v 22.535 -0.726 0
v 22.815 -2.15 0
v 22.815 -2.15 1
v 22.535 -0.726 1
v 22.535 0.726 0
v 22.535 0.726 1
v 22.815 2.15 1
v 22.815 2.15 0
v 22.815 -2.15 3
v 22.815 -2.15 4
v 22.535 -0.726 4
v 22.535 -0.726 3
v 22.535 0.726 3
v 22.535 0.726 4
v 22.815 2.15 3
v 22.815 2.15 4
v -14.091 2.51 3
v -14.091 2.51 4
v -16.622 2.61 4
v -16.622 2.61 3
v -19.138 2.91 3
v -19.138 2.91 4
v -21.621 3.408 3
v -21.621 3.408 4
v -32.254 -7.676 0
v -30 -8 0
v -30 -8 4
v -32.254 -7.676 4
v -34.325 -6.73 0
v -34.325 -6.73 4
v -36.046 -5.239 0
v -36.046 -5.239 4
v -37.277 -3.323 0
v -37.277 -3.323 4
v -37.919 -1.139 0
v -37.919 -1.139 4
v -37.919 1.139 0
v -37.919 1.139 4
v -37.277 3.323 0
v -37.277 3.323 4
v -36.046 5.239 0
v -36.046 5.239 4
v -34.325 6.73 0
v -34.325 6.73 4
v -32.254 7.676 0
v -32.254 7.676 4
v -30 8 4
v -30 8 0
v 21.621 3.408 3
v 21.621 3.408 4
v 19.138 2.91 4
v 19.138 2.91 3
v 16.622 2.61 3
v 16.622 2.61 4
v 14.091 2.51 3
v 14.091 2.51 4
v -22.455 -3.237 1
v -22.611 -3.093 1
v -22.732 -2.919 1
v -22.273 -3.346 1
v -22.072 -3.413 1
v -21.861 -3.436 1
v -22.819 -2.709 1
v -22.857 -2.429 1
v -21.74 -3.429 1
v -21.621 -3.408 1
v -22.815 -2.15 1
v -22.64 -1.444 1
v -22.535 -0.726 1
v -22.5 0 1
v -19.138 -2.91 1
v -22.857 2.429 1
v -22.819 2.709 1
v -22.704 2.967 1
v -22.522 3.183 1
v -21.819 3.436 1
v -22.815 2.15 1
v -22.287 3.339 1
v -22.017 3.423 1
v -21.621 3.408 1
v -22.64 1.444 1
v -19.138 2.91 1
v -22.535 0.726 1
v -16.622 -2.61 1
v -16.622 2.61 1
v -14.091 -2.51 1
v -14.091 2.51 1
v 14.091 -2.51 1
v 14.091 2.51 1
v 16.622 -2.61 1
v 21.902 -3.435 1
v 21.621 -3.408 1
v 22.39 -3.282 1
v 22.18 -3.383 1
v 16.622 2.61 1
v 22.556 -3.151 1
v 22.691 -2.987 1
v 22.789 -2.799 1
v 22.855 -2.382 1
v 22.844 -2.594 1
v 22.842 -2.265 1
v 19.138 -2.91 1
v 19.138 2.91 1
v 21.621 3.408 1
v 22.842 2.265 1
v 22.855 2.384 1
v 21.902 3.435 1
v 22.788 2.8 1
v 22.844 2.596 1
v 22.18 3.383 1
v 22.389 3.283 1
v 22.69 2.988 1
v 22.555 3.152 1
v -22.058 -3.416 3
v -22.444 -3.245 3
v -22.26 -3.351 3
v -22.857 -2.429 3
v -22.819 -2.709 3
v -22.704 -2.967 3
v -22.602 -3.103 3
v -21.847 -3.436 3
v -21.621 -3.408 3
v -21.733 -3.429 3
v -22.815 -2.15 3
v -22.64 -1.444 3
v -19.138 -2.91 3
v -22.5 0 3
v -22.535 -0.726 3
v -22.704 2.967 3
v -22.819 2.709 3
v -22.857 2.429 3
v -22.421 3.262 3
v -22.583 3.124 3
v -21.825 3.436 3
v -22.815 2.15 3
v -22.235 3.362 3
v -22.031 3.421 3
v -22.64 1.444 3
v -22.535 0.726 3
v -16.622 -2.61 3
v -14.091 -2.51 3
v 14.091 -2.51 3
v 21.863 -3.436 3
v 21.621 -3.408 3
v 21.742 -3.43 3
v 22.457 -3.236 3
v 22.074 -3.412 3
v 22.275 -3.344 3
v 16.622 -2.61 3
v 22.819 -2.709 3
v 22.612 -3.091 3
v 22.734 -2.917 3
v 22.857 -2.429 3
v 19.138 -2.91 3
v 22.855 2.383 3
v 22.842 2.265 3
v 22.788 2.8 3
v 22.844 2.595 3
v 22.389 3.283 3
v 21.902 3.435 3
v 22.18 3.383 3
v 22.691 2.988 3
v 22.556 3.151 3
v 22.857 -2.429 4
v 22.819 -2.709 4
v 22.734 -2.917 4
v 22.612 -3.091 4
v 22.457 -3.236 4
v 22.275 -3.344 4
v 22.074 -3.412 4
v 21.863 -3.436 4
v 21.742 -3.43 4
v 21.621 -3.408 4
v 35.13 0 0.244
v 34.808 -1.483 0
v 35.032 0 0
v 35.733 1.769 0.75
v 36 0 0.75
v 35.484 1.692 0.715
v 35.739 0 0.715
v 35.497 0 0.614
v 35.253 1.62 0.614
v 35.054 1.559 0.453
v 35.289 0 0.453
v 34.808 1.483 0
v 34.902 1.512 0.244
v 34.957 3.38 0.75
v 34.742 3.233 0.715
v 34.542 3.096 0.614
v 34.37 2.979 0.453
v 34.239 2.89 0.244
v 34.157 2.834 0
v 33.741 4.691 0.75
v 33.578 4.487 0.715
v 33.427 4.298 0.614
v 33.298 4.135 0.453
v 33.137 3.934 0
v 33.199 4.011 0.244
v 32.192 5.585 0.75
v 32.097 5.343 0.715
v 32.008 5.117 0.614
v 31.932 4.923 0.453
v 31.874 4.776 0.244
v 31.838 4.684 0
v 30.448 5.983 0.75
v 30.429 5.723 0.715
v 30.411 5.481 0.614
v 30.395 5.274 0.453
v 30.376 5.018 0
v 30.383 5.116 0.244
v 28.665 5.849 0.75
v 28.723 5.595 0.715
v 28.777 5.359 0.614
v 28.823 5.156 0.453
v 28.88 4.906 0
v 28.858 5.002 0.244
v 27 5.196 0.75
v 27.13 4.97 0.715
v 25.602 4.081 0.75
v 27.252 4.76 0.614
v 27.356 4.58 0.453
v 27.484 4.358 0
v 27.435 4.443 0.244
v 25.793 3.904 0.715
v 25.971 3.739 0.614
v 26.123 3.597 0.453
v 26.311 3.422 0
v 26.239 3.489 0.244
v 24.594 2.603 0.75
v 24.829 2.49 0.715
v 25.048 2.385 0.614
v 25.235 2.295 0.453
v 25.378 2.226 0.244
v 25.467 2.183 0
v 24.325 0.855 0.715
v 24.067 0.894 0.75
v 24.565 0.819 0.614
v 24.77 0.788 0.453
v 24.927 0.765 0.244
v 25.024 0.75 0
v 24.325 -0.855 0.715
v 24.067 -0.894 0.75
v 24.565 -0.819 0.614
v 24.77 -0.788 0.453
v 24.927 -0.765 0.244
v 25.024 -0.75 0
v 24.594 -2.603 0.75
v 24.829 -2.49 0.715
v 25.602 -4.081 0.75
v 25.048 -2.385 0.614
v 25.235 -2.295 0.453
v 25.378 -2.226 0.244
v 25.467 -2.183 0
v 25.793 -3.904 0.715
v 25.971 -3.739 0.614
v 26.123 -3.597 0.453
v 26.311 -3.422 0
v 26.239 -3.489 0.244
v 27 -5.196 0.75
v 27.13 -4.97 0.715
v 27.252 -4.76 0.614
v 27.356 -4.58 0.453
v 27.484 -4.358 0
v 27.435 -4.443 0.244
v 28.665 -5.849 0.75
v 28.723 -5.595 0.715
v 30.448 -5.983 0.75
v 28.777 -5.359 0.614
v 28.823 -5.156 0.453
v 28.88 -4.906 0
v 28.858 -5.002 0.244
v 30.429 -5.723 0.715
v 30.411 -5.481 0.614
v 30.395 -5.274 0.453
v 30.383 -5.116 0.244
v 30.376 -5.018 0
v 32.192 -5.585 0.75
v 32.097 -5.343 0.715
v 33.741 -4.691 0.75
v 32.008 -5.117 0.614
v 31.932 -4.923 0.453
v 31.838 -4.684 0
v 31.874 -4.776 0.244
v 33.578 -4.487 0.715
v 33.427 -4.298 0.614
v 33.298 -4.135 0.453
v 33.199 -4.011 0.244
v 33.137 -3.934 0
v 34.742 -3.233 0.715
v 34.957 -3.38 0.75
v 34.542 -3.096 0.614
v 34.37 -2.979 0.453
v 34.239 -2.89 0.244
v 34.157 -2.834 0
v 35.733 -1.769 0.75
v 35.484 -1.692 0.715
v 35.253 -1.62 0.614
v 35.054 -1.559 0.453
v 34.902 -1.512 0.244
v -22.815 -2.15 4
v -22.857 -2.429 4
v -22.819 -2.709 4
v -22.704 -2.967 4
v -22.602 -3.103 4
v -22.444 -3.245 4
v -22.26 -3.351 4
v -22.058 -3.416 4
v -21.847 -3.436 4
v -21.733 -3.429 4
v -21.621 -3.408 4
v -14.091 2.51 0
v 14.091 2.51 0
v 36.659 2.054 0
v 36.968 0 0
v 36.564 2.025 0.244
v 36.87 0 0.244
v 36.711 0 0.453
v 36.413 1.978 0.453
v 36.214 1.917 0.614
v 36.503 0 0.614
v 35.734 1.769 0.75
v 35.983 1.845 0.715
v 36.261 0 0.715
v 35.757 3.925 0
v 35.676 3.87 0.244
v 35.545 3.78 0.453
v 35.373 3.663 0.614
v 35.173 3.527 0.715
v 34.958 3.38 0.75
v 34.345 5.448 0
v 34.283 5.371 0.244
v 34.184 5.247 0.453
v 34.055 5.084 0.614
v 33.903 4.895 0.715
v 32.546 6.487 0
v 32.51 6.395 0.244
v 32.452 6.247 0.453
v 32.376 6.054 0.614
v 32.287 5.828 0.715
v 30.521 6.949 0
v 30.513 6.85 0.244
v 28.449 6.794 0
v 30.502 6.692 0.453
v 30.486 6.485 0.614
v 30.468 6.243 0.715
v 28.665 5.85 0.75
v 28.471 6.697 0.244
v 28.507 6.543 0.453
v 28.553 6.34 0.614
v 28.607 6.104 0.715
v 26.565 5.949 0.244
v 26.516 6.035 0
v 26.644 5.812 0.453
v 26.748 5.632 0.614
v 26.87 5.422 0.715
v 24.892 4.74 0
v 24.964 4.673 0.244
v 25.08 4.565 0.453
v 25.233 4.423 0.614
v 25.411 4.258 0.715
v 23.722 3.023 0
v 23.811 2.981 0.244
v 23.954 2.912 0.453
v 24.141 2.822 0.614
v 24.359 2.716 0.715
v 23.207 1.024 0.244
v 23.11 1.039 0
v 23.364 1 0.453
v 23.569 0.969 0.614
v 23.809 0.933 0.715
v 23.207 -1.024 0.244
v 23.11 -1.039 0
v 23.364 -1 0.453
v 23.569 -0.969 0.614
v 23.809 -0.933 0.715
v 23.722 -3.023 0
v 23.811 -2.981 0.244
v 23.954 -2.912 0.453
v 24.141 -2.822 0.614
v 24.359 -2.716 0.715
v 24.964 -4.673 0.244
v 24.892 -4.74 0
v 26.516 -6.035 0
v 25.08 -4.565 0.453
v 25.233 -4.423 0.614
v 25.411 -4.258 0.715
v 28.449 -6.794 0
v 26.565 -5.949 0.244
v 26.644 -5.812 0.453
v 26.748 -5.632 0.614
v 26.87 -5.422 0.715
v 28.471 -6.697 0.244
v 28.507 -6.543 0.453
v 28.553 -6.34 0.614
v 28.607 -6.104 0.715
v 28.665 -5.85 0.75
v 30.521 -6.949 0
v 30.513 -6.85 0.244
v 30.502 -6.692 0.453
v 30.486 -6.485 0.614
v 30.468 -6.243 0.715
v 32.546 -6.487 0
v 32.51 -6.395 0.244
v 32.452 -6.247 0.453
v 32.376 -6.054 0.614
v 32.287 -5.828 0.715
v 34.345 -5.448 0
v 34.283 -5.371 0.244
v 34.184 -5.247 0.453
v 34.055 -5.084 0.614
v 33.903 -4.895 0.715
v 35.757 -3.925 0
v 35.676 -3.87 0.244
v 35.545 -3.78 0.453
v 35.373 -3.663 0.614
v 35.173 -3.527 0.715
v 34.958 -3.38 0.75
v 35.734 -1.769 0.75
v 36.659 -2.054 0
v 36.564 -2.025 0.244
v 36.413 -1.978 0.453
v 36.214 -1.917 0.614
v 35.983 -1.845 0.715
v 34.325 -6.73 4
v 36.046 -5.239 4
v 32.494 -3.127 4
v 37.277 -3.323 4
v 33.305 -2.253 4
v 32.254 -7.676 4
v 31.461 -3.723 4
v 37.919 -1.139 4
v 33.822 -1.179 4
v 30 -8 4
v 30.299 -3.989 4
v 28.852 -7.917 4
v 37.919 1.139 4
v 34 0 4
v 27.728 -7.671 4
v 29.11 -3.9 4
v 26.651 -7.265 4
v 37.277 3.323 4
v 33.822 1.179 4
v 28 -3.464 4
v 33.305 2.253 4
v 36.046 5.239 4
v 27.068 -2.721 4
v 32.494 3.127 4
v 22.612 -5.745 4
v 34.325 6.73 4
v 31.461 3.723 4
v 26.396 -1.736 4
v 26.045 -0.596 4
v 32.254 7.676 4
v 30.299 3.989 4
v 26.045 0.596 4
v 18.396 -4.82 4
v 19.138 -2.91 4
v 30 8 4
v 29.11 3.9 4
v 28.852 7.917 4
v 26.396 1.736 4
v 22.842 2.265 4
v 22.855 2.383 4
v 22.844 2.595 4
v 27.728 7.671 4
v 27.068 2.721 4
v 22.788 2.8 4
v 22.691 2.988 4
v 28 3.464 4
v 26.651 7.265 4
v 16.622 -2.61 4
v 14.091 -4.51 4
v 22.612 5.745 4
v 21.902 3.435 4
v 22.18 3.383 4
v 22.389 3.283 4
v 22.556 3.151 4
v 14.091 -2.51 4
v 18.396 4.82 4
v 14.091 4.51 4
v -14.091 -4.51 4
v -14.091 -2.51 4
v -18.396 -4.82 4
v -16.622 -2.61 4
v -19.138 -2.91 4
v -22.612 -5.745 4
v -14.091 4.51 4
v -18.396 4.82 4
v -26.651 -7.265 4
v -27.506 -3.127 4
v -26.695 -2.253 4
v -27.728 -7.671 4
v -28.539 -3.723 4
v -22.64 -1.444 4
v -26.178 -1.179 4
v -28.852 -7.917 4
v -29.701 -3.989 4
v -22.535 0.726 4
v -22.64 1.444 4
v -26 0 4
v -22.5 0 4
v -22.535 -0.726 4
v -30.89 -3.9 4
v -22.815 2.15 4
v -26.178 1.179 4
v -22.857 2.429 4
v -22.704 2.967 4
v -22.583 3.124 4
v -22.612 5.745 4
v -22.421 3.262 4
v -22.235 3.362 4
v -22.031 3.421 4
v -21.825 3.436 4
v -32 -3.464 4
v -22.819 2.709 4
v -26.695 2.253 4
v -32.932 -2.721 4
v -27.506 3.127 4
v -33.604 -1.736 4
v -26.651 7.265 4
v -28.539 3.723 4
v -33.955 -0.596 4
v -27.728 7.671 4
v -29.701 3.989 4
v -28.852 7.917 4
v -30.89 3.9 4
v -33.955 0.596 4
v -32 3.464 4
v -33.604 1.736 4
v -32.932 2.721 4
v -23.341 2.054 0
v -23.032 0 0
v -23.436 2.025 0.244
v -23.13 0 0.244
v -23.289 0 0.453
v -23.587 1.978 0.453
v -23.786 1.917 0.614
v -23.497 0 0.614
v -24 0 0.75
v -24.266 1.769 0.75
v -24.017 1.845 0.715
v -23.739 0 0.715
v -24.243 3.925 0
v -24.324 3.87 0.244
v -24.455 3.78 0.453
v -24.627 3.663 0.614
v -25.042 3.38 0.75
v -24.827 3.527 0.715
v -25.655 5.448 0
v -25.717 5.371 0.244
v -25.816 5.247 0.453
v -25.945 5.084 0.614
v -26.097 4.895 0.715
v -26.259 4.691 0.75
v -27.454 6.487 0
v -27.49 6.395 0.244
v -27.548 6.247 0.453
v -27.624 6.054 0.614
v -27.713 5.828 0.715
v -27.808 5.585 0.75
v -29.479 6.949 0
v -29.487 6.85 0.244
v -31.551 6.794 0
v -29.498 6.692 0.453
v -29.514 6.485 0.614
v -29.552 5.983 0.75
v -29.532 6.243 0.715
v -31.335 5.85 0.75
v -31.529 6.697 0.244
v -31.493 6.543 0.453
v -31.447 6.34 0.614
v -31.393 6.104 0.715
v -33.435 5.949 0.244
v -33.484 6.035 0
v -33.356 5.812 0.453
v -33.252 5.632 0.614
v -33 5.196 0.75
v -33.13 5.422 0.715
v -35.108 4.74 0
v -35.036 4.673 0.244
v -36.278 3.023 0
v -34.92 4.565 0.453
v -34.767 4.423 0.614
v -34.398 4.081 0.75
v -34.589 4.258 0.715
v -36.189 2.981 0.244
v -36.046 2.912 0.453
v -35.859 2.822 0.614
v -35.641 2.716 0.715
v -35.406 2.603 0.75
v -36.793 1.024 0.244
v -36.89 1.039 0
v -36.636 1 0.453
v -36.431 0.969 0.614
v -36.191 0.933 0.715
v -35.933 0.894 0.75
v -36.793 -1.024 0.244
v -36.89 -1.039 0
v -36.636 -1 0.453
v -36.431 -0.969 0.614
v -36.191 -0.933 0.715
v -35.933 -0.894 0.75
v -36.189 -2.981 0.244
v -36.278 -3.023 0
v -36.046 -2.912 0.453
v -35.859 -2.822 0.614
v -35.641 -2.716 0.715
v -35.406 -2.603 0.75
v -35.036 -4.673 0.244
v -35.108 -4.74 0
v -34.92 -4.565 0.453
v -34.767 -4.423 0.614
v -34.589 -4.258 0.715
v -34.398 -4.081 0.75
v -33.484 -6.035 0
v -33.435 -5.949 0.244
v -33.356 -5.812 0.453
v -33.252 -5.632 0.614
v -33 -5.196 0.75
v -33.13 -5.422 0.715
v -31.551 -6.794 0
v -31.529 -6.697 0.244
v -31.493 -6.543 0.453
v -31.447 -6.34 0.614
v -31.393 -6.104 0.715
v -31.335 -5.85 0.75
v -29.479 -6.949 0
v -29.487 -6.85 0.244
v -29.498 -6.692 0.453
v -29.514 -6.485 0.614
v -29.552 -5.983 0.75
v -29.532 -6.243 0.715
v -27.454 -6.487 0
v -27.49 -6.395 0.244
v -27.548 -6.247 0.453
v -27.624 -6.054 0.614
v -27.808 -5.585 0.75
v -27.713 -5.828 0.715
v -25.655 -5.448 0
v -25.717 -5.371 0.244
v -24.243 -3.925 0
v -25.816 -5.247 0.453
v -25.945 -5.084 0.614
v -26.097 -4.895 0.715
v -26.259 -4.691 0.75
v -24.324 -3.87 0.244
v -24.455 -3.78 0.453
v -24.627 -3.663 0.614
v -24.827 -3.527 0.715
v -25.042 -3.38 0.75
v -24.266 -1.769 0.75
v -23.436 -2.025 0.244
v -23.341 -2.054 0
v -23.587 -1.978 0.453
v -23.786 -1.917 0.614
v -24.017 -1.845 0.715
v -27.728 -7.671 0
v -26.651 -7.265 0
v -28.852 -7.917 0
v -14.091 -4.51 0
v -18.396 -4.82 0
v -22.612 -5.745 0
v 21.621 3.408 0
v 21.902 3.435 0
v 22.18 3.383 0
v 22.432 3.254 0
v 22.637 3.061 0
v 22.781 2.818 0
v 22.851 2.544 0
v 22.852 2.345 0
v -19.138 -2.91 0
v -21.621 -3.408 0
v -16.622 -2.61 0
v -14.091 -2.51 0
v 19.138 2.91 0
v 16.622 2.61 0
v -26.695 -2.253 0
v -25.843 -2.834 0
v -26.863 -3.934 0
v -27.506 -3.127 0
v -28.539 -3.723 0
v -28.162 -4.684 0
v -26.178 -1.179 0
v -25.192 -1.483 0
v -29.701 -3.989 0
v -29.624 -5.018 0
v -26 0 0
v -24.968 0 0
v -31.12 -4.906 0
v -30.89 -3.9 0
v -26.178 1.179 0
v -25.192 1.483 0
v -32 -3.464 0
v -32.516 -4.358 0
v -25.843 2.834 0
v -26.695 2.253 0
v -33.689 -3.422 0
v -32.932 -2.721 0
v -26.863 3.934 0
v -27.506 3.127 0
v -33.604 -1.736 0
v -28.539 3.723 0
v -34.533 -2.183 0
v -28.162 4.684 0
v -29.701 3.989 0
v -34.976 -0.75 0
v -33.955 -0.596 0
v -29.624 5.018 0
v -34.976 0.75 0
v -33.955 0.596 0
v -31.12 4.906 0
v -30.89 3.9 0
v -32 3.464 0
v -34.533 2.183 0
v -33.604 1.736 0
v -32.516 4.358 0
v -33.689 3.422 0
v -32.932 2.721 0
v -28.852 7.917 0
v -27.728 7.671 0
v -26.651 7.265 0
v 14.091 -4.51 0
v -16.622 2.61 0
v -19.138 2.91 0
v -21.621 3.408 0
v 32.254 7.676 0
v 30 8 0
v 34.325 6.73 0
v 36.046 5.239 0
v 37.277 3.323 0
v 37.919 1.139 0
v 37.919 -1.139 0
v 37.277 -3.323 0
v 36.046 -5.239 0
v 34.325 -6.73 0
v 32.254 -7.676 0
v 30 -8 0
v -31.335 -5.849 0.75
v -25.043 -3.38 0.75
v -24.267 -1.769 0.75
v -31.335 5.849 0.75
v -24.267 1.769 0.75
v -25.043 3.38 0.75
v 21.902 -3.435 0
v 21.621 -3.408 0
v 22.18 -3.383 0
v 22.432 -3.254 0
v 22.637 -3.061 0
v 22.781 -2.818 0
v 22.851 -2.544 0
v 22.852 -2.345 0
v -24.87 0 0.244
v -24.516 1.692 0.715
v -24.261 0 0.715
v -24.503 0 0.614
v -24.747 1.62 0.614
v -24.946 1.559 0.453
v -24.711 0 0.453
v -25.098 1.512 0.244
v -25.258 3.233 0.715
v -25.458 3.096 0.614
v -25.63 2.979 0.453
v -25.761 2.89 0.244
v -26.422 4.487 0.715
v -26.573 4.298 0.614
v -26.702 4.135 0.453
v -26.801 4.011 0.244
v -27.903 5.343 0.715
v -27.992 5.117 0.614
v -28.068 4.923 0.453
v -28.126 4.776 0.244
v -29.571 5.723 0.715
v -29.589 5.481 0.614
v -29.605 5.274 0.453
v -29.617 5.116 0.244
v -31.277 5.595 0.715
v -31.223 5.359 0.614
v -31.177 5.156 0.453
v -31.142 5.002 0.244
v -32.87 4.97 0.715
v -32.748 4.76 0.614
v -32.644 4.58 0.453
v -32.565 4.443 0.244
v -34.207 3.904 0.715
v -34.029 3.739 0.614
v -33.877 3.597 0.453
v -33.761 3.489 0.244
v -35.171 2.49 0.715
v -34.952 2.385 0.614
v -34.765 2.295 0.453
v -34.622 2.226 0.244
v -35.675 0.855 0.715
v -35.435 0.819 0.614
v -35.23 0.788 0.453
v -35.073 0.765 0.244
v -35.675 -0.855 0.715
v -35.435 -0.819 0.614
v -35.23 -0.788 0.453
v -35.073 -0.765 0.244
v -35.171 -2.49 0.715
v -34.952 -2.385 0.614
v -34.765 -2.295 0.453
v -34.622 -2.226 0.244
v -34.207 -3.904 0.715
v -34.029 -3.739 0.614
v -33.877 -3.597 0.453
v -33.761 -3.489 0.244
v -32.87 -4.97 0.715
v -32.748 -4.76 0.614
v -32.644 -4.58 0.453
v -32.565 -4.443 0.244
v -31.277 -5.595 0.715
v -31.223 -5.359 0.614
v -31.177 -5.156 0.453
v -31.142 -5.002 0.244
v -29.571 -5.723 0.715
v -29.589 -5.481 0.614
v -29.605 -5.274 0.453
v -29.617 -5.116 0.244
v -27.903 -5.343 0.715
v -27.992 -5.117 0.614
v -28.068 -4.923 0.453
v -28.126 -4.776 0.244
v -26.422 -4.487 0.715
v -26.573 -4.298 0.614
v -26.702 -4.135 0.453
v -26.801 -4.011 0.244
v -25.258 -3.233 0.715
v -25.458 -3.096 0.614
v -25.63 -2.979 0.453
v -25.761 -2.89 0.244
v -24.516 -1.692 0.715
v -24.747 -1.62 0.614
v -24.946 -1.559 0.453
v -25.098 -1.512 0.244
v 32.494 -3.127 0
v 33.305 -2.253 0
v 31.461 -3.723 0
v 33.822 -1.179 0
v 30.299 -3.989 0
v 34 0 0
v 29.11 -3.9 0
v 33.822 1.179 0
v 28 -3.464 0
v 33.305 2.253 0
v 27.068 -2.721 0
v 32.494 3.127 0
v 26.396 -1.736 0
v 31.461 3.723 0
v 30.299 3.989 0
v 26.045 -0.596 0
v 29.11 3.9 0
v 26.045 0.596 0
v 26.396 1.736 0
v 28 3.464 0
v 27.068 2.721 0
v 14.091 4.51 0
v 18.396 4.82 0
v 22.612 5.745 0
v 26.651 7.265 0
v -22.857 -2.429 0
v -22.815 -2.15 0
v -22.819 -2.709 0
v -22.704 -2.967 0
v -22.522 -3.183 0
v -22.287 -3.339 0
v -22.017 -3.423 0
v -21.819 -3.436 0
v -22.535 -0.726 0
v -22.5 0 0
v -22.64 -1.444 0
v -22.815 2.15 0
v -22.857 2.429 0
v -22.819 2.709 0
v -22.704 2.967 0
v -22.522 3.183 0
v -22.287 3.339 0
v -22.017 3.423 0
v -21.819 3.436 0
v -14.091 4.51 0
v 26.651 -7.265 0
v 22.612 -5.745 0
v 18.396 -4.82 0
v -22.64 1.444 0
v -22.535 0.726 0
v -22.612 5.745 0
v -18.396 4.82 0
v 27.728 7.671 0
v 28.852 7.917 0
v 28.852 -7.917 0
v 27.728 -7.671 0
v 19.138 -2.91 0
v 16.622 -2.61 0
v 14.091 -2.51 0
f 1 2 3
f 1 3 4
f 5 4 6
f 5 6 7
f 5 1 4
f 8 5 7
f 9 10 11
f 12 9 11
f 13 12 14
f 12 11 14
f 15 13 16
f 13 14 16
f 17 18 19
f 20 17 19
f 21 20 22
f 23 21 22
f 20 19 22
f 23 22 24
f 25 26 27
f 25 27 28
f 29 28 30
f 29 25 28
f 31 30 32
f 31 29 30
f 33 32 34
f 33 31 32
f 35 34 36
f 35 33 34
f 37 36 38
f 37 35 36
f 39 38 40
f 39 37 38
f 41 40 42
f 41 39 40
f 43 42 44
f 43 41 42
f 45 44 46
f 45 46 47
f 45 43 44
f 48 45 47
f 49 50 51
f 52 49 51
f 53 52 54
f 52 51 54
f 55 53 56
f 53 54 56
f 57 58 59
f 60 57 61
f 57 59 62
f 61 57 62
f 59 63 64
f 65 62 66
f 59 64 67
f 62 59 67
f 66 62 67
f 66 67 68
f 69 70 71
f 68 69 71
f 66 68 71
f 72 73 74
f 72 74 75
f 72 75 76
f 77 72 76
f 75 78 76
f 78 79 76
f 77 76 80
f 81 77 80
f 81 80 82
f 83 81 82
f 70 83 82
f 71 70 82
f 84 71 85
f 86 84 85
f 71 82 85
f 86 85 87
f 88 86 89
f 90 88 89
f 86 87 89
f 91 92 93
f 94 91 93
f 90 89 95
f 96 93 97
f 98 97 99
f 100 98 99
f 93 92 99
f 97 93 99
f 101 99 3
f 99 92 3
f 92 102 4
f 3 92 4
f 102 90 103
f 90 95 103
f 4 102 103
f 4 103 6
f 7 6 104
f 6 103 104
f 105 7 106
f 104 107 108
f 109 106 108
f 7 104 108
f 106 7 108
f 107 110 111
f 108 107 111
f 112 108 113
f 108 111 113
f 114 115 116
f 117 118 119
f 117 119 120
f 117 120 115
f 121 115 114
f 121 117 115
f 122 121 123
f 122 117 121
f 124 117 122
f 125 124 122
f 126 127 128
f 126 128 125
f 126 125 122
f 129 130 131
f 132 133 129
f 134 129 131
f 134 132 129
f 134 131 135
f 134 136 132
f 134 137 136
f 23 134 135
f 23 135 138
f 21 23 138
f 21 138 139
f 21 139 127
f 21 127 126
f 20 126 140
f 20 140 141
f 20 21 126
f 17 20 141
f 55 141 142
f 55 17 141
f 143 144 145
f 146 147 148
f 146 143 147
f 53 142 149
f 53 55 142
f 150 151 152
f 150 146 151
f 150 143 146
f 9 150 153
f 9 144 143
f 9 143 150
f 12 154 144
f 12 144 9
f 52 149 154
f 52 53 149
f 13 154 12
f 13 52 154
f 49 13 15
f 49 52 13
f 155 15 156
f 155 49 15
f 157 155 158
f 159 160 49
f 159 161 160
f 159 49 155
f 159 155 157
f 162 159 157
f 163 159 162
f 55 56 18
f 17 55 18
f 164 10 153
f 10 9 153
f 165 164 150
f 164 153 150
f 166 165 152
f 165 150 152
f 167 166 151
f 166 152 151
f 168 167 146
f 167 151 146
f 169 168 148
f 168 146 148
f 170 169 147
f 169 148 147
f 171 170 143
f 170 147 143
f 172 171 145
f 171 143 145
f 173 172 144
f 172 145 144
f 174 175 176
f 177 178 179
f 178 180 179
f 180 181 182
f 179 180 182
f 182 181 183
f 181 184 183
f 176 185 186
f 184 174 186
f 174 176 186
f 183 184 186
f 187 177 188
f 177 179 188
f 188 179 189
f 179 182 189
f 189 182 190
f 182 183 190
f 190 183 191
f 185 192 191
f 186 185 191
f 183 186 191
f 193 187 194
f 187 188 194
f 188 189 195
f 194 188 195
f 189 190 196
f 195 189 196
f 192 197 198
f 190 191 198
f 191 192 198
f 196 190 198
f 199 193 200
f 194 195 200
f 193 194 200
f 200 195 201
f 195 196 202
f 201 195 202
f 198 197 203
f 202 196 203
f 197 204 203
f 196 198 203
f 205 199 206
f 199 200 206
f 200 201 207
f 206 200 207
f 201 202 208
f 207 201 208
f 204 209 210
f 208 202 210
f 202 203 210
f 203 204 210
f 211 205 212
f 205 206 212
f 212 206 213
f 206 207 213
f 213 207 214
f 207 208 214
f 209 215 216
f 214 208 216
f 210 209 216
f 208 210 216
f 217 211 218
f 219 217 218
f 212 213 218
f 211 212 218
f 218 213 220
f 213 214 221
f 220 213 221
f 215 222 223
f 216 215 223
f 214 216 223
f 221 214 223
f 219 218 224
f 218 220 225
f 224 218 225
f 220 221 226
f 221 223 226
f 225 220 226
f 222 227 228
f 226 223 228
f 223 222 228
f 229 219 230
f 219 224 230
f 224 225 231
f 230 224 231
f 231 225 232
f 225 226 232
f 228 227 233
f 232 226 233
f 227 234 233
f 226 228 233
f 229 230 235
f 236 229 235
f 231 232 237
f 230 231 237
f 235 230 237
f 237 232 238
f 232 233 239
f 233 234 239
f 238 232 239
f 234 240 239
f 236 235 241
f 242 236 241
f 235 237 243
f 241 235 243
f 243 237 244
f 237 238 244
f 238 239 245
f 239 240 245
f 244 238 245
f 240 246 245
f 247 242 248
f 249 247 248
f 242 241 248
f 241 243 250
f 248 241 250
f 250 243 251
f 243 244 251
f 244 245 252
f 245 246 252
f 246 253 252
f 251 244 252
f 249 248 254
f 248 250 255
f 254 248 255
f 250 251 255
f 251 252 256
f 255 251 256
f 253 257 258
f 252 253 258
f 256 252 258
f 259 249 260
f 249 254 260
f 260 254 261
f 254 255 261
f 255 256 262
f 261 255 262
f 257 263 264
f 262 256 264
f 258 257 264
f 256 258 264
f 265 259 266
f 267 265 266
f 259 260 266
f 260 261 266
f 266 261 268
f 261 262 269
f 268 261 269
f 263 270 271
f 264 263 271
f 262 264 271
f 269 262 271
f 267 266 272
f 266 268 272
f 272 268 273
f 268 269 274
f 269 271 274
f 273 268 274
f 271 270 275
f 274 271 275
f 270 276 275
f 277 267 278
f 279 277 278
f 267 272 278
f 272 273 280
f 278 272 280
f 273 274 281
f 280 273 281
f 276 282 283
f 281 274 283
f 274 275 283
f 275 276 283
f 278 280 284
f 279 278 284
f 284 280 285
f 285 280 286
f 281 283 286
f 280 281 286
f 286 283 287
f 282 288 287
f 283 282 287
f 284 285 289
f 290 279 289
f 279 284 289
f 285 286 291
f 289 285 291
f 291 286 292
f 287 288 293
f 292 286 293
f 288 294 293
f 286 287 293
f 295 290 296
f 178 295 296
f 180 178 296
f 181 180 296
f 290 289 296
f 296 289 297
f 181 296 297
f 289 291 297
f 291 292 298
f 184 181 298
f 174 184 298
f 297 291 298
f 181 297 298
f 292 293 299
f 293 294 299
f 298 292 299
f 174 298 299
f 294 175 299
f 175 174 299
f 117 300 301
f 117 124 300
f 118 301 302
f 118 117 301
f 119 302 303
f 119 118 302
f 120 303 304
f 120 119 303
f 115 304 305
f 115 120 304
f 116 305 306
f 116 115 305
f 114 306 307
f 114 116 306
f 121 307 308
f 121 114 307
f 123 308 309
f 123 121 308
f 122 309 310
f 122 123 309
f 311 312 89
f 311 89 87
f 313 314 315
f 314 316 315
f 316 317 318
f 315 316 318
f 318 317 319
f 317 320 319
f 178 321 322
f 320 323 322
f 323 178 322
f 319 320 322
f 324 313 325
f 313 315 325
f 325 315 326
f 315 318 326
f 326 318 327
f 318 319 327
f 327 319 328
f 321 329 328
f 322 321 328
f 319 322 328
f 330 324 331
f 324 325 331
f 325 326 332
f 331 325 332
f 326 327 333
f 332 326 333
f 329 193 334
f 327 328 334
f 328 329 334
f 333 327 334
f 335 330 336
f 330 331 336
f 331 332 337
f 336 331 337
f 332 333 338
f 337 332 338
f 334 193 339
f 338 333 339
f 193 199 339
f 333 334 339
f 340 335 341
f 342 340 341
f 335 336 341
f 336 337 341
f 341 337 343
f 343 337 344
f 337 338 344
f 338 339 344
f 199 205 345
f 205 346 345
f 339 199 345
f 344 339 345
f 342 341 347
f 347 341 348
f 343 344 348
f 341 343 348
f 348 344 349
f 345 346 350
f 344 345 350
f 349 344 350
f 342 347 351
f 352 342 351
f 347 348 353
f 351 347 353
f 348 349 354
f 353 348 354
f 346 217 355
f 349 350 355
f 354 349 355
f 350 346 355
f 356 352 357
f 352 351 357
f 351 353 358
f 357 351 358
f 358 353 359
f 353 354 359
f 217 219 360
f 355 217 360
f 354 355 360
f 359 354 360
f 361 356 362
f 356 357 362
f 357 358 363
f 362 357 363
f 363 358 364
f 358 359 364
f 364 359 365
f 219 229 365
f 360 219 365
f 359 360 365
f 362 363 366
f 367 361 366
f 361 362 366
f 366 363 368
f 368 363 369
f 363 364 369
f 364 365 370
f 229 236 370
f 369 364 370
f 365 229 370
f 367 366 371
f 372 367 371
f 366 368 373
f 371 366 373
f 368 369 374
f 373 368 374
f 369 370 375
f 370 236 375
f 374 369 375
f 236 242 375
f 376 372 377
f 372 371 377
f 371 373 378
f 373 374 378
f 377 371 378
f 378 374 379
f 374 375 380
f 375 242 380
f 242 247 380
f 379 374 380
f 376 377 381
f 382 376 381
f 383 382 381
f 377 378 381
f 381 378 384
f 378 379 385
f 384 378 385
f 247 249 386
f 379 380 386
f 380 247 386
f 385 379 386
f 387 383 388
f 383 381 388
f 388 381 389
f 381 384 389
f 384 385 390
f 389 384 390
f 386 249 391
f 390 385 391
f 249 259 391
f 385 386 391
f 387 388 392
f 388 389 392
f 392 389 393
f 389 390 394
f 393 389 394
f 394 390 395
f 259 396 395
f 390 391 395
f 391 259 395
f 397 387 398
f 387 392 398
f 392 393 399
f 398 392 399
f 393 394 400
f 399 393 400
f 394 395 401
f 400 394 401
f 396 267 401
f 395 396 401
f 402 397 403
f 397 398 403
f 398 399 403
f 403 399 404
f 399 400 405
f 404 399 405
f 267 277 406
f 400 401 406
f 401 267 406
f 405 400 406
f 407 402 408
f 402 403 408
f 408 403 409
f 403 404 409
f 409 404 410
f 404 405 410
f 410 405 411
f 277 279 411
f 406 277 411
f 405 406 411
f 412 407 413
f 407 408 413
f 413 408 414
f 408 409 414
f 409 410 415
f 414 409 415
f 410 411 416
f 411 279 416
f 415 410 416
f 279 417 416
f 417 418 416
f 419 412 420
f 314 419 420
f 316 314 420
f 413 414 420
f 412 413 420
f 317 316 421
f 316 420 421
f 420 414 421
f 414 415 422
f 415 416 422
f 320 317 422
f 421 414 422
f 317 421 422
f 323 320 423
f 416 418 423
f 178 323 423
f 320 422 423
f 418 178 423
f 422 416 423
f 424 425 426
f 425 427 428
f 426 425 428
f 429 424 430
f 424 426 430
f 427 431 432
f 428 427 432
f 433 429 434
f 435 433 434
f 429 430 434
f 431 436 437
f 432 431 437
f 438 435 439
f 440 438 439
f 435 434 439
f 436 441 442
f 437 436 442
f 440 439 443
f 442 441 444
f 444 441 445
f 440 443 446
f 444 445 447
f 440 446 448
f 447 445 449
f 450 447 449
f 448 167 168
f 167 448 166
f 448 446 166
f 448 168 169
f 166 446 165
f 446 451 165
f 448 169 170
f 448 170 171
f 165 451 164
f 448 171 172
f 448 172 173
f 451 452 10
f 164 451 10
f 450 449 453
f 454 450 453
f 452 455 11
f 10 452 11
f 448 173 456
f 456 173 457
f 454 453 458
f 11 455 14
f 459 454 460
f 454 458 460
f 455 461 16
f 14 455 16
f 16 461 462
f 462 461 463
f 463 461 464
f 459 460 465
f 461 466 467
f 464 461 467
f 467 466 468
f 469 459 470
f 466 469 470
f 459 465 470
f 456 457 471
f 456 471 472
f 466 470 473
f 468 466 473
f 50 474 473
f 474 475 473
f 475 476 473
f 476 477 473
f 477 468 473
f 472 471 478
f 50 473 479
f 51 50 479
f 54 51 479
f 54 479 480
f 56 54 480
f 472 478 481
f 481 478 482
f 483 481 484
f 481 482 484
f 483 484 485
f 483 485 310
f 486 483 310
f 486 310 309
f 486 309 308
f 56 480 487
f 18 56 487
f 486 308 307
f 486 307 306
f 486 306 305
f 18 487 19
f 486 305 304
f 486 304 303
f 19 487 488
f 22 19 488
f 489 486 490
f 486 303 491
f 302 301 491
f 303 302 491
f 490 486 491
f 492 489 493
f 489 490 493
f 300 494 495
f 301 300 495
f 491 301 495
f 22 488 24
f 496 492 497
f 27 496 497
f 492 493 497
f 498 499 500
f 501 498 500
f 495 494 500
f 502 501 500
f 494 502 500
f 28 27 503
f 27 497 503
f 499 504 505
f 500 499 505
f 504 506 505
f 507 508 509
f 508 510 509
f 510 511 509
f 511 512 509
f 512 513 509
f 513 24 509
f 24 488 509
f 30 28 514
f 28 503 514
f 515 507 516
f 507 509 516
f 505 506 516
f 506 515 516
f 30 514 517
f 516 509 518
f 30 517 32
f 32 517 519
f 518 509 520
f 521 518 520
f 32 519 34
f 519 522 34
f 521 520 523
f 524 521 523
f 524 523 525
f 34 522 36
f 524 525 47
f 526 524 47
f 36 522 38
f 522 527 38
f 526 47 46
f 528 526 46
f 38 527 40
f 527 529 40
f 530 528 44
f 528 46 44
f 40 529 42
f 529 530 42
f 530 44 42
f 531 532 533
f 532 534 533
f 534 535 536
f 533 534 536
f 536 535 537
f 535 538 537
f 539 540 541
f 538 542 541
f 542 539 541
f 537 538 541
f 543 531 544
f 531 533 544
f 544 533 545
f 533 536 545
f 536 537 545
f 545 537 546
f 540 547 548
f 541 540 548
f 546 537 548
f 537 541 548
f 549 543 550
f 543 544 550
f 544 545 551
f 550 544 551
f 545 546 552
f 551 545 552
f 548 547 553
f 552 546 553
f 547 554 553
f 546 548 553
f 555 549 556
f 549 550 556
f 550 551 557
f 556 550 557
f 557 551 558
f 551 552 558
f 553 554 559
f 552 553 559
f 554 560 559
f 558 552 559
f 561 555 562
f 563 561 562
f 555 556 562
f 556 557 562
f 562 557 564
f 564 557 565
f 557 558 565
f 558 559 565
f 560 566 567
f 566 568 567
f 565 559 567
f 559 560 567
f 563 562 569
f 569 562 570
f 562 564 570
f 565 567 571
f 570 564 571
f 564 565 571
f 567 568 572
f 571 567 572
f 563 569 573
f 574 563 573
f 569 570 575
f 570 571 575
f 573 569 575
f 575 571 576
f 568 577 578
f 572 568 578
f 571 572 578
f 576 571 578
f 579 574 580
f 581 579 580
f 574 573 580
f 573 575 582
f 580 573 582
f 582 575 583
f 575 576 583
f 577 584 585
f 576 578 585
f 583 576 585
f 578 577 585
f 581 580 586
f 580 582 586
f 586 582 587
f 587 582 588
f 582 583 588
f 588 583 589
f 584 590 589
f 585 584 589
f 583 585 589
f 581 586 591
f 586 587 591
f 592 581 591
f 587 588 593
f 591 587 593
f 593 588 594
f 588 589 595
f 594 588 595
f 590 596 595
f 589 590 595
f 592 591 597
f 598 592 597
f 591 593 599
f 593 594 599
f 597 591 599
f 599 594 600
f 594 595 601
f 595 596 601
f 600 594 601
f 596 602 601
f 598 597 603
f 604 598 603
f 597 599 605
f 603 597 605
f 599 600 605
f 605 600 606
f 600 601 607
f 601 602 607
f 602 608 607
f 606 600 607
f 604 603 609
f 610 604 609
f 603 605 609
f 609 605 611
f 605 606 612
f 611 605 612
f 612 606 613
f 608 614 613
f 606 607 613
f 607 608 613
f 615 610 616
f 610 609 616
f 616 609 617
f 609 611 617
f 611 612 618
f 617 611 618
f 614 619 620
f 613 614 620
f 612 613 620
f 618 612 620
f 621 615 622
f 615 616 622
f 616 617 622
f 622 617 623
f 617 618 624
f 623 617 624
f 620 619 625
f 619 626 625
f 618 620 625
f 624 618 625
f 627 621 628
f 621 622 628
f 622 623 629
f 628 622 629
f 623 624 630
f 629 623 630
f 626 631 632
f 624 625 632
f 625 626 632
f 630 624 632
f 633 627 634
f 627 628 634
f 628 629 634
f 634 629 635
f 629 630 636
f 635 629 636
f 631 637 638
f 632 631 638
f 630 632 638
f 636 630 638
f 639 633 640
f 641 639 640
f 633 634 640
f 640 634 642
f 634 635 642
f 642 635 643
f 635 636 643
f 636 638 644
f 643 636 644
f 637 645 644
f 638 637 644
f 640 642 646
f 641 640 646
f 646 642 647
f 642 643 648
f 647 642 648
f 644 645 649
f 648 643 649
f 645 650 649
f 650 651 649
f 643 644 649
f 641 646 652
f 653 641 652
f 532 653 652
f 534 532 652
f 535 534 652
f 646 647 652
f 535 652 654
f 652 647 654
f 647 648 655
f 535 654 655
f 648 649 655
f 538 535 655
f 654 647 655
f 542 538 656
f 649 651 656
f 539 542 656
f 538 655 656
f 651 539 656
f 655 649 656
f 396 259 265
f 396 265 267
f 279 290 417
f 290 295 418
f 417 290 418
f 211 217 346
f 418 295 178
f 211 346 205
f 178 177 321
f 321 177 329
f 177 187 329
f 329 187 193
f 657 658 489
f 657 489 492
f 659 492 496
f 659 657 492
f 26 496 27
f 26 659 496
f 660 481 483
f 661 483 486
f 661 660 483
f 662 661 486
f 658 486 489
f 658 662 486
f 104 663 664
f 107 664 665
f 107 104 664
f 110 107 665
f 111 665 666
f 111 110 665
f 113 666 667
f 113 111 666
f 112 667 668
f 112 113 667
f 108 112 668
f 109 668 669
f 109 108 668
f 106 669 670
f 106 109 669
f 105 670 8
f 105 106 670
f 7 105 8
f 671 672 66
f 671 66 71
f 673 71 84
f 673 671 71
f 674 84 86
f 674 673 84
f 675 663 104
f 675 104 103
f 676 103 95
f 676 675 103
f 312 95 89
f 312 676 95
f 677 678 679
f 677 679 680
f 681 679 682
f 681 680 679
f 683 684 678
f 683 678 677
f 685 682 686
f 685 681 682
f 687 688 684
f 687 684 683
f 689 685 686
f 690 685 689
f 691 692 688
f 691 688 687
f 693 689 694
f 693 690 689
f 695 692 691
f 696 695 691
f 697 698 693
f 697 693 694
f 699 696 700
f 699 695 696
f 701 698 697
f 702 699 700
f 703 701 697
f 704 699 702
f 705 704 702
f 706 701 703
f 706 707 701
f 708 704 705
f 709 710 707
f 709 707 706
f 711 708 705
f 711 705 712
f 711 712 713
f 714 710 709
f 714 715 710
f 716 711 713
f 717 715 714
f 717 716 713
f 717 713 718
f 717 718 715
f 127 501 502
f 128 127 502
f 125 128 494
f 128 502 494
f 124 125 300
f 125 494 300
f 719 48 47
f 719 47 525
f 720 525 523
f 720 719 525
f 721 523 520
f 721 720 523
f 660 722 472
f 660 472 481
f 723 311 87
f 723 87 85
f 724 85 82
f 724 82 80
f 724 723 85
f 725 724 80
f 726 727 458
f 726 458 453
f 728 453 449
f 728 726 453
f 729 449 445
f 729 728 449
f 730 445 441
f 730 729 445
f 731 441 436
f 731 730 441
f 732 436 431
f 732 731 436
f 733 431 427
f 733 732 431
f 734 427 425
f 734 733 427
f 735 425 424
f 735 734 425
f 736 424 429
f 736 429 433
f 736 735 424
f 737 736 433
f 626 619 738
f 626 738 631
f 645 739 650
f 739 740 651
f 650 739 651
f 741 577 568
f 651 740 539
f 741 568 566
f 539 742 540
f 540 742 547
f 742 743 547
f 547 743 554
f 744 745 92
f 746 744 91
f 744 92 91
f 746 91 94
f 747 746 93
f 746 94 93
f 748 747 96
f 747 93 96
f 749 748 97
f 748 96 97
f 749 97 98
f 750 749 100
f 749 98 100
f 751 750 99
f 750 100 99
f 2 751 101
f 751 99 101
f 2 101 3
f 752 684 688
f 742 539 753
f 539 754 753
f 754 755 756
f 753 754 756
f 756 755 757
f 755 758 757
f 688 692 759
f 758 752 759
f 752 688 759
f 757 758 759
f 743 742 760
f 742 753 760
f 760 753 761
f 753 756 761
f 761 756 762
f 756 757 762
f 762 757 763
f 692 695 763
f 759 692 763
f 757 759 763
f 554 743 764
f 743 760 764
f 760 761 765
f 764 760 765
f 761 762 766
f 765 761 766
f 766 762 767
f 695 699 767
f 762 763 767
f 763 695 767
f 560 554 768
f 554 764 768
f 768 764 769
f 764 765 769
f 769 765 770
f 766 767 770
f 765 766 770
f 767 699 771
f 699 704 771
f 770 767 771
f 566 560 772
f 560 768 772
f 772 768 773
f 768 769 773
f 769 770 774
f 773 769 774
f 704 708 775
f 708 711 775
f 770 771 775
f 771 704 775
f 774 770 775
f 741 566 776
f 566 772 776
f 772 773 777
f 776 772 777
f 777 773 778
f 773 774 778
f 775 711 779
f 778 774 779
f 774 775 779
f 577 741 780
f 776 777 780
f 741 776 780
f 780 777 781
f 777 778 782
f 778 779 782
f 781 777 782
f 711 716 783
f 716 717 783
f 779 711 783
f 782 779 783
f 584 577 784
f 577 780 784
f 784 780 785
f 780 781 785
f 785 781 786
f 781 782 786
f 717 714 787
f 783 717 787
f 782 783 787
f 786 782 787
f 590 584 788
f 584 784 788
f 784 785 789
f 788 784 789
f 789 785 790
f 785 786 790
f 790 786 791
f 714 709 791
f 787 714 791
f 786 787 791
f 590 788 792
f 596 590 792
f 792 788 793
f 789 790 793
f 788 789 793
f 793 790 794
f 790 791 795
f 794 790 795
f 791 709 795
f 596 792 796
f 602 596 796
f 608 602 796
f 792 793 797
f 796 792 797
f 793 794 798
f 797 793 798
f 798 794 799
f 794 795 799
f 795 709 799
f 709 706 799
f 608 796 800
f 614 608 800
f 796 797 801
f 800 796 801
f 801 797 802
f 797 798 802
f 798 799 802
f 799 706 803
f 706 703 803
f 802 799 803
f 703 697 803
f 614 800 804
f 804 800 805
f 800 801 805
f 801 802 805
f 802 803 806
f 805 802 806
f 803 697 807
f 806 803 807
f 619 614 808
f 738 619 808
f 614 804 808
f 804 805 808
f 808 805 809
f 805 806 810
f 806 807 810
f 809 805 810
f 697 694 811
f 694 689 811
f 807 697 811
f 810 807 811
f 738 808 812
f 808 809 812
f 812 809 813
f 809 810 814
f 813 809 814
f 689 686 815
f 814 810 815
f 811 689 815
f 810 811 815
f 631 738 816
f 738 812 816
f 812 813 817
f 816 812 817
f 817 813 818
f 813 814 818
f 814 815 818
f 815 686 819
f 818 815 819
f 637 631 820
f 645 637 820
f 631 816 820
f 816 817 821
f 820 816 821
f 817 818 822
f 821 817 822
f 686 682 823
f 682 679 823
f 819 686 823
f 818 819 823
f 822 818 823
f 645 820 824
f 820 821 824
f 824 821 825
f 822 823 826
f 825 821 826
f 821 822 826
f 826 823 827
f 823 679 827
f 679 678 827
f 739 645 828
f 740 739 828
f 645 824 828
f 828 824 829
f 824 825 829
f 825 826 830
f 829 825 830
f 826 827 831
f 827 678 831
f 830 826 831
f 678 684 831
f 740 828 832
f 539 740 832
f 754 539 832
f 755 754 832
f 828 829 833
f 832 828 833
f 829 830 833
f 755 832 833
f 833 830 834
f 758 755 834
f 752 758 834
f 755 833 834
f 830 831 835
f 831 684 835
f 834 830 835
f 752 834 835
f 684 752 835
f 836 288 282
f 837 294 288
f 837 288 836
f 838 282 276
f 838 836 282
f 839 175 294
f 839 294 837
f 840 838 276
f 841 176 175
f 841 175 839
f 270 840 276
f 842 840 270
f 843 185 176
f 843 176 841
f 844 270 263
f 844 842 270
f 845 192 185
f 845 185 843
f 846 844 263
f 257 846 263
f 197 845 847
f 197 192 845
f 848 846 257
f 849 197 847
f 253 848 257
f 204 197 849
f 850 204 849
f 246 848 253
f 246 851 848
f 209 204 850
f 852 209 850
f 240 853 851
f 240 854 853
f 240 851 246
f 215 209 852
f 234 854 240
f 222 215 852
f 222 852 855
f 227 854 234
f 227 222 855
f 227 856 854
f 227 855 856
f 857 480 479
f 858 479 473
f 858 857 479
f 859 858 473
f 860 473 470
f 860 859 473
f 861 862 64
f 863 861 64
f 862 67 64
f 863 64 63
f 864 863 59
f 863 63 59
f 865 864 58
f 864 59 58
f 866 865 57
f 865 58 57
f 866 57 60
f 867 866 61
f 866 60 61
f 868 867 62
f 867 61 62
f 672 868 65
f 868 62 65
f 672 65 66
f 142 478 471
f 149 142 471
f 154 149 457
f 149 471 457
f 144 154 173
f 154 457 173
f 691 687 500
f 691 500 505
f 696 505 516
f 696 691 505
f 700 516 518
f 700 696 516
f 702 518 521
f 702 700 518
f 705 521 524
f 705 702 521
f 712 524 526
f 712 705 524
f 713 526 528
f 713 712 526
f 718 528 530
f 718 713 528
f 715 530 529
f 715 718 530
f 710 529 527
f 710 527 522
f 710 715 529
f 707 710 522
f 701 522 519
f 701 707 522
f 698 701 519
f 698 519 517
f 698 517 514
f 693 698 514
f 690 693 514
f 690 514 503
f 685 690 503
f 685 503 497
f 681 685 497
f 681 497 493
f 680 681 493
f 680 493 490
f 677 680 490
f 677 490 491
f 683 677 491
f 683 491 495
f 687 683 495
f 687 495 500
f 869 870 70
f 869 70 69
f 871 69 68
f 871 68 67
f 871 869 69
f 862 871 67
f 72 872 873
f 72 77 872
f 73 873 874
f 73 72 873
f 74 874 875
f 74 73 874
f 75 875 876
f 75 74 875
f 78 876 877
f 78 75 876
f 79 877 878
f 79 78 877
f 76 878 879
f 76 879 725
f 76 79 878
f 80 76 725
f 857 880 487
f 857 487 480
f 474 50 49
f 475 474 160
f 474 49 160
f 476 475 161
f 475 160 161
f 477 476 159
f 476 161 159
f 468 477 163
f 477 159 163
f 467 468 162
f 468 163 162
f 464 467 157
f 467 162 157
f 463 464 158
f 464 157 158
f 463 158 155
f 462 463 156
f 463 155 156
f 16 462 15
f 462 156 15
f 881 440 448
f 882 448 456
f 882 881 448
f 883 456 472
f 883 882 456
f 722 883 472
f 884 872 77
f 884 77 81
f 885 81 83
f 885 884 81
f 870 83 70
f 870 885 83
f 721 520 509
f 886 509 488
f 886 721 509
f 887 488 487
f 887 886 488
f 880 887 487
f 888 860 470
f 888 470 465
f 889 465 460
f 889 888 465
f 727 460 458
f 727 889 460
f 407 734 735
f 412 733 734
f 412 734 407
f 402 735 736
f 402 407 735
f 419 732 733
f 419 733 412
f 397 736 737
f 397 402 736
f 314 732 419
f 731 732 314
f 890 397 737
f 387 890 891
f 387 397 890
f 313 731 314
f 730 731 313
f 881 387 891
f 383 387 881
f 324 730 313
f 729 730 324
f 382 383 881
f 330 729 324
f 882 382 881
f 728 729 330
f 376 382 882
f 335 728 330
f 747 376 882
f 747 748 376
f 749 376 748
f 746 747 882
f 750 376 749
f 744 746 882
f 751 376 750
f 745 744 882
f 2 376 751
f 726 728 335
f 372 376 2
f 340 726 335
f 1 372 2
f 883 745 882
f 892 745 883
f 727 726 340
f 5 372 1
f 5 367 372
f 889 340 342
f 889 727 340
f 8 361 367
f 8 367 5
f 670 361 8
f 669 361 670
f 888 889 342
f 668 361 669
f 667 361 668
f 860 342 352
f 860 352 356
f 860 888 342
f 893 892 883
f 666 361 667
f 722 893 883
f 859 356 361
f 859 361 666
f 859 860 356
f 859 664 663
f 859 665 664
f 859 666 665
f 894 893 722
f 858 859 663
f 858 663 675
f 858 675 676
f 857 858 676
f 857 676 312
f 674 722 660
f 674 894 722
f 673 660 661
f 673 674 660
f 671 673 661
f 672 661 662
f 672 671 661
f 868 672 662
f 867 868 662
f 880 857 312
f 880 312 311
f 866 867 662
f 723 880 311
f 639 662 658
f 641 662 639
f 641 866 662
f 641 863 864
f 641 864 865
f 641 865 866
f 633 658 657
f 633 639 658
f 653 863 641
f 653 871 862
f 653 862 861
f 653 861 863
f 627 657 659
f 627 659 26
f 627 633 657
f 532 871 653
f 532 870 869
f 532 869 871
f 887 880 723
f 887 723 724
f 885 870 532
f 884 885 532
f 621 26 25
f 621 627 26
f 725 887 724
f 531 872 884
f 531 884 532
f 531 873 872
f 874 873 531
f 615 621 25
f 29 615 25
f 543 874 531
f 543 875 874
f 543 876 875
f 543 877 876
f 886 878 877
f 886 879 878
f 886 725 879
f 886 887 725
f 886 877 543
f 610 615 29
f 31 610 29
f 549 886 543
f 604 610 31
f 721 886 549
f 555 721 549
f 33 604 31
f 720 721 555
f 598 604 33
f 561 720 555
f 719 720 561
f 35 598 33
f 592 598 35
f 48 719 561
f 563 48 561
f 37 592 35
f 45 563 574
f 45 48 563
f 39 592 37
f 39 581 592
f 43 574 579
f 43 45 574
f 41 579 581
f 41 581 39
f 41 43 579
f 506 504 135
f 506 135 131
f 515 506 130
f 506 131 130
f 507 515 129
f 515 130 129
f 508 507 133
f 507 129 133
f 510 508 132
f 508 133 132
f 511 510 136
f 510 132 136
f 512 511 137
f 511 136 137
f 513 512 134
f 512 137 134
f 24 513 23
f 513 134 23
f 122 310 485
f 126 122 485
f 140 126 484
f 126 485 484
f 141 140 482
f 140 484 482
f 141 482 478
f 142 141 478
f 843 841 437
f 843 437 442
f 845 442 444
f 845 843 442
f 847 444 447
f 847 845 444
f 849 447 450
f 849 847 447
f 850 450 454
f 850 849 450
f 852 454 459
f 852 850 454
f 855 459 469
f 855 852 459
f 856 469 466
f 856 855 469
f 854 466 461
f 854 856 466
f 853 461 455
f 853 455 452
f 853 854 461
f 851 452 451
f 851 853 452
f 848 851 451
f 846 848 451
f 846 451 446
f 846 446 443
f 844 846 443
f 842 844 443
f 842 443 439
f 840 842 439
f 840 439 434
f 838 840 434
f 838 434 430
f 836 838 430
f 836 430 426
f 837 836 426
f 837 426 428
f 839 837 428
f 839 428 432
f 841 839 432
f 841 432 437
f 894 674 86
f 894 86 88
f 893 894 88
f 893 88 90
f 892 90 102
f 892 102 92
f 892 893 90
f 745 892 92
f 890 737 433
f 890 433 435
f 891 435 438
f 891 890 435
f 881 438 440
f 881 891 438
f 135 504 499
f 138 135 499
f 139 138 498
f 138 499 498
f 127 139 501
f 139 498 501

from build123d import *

# Parameters (mm, degrees)
SKETCH_1_R             = 4
EXTRUDE_1_DEPTH        = 4
CUT_EXTRUDE_START      = -10
CUT_EXTRUDE_1_DEPTH    = 10
CUT_EXTRUDE_2_DEPTH    = 1
FILLET_1_R             = 1
SKETCH_5_R             = 7.5
SKETCH_5_R_2           = 4
EXTRUDE_2_DEPTH        = 0.25
FILLET_1_OF_MIRROR_1_R = 1
SKETCH_4_R             = 7
SKETCH_4_R_2           = 5
CUT_EXTRUDE_3_DEPTH    = 1
FILLET_2_R             = 1
CUT_EXTRUDE_START_2    = -0.25
SKETCH_6_R             = 7.5
CUT_EXTRUDE_4_DEPTH    = 0.25


with BuildPart() as part:
    # 草图1 → 凸台-拉伸1 (new body)
    with BuildSketch(Plane.XY):
        with BuildLine():
            Line((-30, 8), (30, 8))
            ThreePointArc((30, 8), (38, 0), (30, -8))
            Line((30, -8), (-30, -8))
            ThreePointArc((-30, -8), (-38, 0), (-30, 8))
        make_face()
        with Locations((-30, 0)):
            Circle(SKETCH_1_R, mode=Mode.SUBTRACT)
        with Locations((30, 0)):
            Circle(SKETCH_1_R, mode=Mode.SUBTRACT)
    extrude(amount=EXTRUDE_1_DEPTH)

    # 草图2 → 切除-拉伸1 (cut)
    with BuildSketch(Plane.XY.offset(4).offset(CUT_EXTRUDE_START)):
        with BuildLine():
            Line((30, 8), (-30, 8))
            ThreePointArc((-30, 8), (-28.285581944, 7.814139155), (-26.650824686, 7.265192683))
            ThreePointArc((-26.650824686, 7.265192683), (-20.520484967, 5.206643412), (-14.091417259, 4.509665243))
            Line((-14.091417259, 4.509665243), (14.091417259, 4.509665243))
            ThreePointArc((14.091417259, 4.509665243), (20.520484967, 5.206643412), (26.650824686, 7.265192683))
            ThreePointArc((26.650824686, 7.265192683), (28.285581944, 7.814139155), (30, 8))
        make_face()
        with BuildLine():
            Line((14.091417259, -4.509665243), (-14.091417259, -4.509665243))
            ThreePointArc((-14.091417259, -4.509665243), (-20.520484967, -5.206643412), (-26.650824686, -7.265192683))
            ThreePointArc((-26.650824686, -7.265192683), (-28.285581944, -7.814139155), (-30, -8))
            Line((-30, -8), (30, -8))
            ThreePointArc((30, -8), (28.285581944, -7.814139155), (26.650824686, -7.265192683))
            ThreePointArc((26.650824686, -7.265192683), (20.520484967, -5.206643412), (14.091417259, -4.509665243))
        make_face()
    extrude(amount=CUT_EXTRUDE_1_DEPTH, mode=Mode.SUBTRACT)

    # 草图3 → 切除-拉伸2 (cut)
    with BuildSketch(Plane.XY.offset(4)):
        with BuildLine():
            ThreePointArc((-23.634199351, -3.965675491), (-18.918027247, -2.875761974), (-14.091417259, -2.509665243))
            Line((-14.091417259, -2.509665243), (14.091417259, -2.509665243))
            ThreePointArc((14.091417259, -2.509665243), (18.918027247, -2.875761974), (23.634199351, -3.965675491))
            ThreePointArc((23.634199351, -3.965675491), (22.5, 0), (23.634199351, 3.965675491))
            ThreePointArc((23.634199351, 3.965675491), (18.918027247, 2.875761974), (14.091417259, 2.509665243))
            Line((14.091417259, 2.509665243), (-14.091417259, 2.509665243))
            ThreePointArc((-14.091417259, 2.509665243), (-18.918027247, 2.875761974), (-23.634199351, 3.965675491))
            ThreePointArc((-23.634199351, 3.965675491), (-22.789122631, 2.062340313), (-22.5, 0))
            ThreePointArc((-22.5, 0), (-22.789122631, -2.062340313), (-23.634199351, -3.965675491))
        make_face()
    cut_extrude_2 = extrude(amount=-CUT_EXTRUDE_2_DEPTH, mode=Mode.SUBTRACT)

    # 圆角1
    fillet_1_edges = [part.edges().sort_by_distance(p)[0] for p in [
        (23.634199351, -3.965675491, 3.5),
        (-23.634199351, -3.965675491, 3.5),
        (-23.634199351, 3.965675491, 3.5),
        (23.634199351, 3.965675491, 3.5),
    ]]
    fillet(fillet_1_edges, radius=FILLET_1_R)

    # 草图5 → 凸台-拉伸2 (add)
    # profile 1 of 2: a face of its own
    with BuildSketch(Plane(origin=(0, 0, 0), x_dir=(-1, 0, 0), z_dir=(0, 0, -1))):
        with Locations((30, 0)):
            Circle(SKETCH_5_R)
        with Locations((30, 0)):
            Circle(SKETCH_5_R_2, mode=Mode.SUBTRACT)
    # profile 2 of 2: a face of its own
    with BuildSketch(Plane(origin=(0, 0, 0), x_dir=(-1, 0, 0), z_dir=(0, 0, -1))):
        with Locations(Location((-30, 0, 0), (0, 0, 180))):
            Circle(SKETCH_5_R)
        with Locations((-30, 0)):
            Circle(SKETCH_5_R_2, mode=Mode.SUBTRACT)
    extrude(amount=EXTRUDE_2_DEPTH)

    # 镜向1: 切除-拉伸2 across plane
    add(cut_extrude_2.mirror(Plane(origin=(0, 0, 2), x_dir=(1, 0, 0), z_dir=(0, 0, -1))), mode=Mode.SUBTRACT)

    # 圆角1 of 镜向1
    fillet_1_of_mirror_1_edges = [part.edges().sort_by_distance(p)[0] for p in [
        (23.634199351, -3.965675491, 0.5),
        (-23.634199351, -3.965675491, 0.5),
        (-23.634199351, 3.965675491, 0.5),
        (23.634199351, 3.965675491, 0.5),
    ]]
    fillet(fillet_1_of_mirror_1_edges, radius=FILLET_1_OF_MIRROR_1_R)

    # 草图4 → 切除-拉伸3 (cut)
    # profile 1 of 2: a face of its own
    with BuildSketch(Plane.XY.offset(-0.25)):
        with Locations((30, 0)):
            Circle(SKETCH_4_R)
        with Locations((30, 0)):
            Circle(SKETCH_4_R_2, mode=Mode.SUBTRACT)
    # profile 2 of 2: a face of its own
    with BuildSketch(Plane.XY.offset(-0.25)):
        with Locations((-30, 0)):
            Circle(SKETCH_4_R)
        with Locations((-30, 0)):
            Circle(SKETCH_4_R_2, mode=Mode.SUBTRACT)
    extrude(amount=CUT_EXTRUDE_3_DEPTH, mode=Mode.SUBTRACT)

    # 圆角2
    fillet_2_edges = [part.edges().sort_by_distance(p)[0] for p in [
        (23, 0, 0.75),
        (25, 0, 0.75),
        (-37, 0, 0.75),
        (-35, 0, 0.75),
    ]]
    fillet(fillet_2_edges, radius=FILLET_2_R - 0.0001)  # a hair under: the kernel refuses the full size

    # 草图6 → 切除-拉伸4 (cut)
    with BuildSketch(Plane(origin=(0, 0, -0.25), x_dir=(-1, 0, 0), z_dir=(0, 0, -1)).offset(CUT_EXTRUDE_START_2)):
        with Locations((30, 0)):
            Circle(SKETCH_6_R)
        with Locations((-30, 0)):
            Circle(SKETCH_6_R)
    extrude(amount=CUT_EXTRUDE_4_DEPTH, mode=Mode.SUBTRACT)


solid = part.part
